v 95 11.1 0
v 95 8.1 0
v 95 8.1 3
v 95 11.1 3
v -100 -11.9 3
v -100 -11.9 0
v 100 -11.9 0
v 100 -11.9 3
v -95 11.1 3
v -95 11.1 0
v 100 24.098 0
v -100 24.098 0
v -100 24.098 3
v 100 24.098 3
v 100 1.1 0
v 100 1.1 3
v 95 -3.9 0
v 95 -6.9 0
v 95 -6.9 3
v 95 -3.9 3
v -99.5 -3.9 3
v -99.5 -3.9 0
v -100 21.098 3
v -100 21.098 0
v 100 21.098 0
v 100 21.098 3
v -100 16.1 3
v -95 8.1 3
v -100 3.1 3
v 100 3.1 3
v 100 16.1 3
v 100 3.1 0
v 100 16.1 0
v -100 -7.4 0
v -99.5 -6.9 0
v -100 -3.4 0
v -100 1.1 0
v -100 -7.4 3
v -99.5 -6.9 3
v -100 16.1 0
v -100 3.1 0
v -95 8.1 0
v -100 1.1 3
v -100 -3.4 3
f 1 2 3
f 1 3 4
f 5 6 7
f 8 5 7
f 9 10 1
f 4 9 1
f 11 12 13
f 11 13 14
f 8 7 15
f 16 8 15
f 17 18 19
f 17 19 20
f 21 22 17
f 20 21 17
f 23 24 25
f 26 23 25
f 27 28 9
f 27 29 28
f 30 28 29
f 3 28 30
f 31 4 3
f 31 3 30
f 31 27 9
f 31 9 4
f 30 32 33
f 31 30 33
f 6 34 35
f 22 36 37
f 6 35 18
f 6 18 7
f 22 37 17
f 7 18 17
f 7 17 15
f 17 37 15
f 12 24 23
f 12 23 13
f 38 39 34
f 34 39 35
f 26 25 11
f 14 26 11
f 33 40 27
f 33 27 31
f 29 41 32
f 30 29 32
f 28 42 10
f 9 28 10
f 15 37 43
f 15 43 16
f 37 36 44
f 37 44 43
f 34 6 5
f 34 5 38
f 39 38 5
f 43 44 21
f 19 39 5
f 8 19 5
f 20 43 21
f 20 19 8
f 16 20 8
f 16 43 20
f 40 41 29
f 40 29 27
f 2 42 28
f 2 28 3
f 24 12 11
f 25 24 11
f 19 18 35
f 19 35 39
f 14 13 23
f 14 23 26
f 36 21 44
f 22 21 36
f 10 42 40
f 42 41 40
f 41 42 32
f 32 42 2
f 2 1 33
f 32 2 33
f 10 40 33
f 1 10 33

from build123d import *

# Parameters (mm, degrees)
F0_W     = 200
F0_H     = 3
F1_DEPTH = 3
F0_H_2   = 13
F0_W_2   = 190
F3_DEPTH = 25
F4_SIZE  = 0.5


with BuildPart() as f1:
    # F0 (on Top) → F1 (new body)
    with BuildSketch(Plane.XY):
        with Locations((0, 22.59805426)):
            Rectangle(F0_W, F0_H)
    extrude(amount=F1_DEPTH)


with BuildPart() as f1b:
    # F0 (on Top) → F1, piece 2 (new body)
    with BuildSketch(Plane.XY):
        with Locations((0, 9.599968791)):
            Rectangle(F0_W, F0_H_2)
        with Locations((0, 9.599968791)):
            Rectangle(F0_W_2, F0_H, mode=Mode.SUBTRACT)
    extrude(amount=F1_DEPTH)


with BuildPart() as f2_1:
    # F2: copy of F1b
    add(f1b.part.moved(Location((0, -15, 0))))

    # F3 (cut): a face of the model
    f3_faces = [f2_1.faces().sort_by_distance(p)[0] for p in [
        (-95, -5.400031209, 1.5),
    ]]
    extrude(f3_faces, amount=-F3_DEPTH, mode=Mode.SUBTRACT)

    # F4
    f4_edges = [f2_1.edges().sort_by_distance(p)[0] for p in [
        (-100, -3.900031, 1.5),
        (-100, -6.900031, 1.5),
    ]]
    chamfer(f4_edges, length=F4_SIZE)


solid = Compound([f1.part, f1b.part, f2_1.part])
